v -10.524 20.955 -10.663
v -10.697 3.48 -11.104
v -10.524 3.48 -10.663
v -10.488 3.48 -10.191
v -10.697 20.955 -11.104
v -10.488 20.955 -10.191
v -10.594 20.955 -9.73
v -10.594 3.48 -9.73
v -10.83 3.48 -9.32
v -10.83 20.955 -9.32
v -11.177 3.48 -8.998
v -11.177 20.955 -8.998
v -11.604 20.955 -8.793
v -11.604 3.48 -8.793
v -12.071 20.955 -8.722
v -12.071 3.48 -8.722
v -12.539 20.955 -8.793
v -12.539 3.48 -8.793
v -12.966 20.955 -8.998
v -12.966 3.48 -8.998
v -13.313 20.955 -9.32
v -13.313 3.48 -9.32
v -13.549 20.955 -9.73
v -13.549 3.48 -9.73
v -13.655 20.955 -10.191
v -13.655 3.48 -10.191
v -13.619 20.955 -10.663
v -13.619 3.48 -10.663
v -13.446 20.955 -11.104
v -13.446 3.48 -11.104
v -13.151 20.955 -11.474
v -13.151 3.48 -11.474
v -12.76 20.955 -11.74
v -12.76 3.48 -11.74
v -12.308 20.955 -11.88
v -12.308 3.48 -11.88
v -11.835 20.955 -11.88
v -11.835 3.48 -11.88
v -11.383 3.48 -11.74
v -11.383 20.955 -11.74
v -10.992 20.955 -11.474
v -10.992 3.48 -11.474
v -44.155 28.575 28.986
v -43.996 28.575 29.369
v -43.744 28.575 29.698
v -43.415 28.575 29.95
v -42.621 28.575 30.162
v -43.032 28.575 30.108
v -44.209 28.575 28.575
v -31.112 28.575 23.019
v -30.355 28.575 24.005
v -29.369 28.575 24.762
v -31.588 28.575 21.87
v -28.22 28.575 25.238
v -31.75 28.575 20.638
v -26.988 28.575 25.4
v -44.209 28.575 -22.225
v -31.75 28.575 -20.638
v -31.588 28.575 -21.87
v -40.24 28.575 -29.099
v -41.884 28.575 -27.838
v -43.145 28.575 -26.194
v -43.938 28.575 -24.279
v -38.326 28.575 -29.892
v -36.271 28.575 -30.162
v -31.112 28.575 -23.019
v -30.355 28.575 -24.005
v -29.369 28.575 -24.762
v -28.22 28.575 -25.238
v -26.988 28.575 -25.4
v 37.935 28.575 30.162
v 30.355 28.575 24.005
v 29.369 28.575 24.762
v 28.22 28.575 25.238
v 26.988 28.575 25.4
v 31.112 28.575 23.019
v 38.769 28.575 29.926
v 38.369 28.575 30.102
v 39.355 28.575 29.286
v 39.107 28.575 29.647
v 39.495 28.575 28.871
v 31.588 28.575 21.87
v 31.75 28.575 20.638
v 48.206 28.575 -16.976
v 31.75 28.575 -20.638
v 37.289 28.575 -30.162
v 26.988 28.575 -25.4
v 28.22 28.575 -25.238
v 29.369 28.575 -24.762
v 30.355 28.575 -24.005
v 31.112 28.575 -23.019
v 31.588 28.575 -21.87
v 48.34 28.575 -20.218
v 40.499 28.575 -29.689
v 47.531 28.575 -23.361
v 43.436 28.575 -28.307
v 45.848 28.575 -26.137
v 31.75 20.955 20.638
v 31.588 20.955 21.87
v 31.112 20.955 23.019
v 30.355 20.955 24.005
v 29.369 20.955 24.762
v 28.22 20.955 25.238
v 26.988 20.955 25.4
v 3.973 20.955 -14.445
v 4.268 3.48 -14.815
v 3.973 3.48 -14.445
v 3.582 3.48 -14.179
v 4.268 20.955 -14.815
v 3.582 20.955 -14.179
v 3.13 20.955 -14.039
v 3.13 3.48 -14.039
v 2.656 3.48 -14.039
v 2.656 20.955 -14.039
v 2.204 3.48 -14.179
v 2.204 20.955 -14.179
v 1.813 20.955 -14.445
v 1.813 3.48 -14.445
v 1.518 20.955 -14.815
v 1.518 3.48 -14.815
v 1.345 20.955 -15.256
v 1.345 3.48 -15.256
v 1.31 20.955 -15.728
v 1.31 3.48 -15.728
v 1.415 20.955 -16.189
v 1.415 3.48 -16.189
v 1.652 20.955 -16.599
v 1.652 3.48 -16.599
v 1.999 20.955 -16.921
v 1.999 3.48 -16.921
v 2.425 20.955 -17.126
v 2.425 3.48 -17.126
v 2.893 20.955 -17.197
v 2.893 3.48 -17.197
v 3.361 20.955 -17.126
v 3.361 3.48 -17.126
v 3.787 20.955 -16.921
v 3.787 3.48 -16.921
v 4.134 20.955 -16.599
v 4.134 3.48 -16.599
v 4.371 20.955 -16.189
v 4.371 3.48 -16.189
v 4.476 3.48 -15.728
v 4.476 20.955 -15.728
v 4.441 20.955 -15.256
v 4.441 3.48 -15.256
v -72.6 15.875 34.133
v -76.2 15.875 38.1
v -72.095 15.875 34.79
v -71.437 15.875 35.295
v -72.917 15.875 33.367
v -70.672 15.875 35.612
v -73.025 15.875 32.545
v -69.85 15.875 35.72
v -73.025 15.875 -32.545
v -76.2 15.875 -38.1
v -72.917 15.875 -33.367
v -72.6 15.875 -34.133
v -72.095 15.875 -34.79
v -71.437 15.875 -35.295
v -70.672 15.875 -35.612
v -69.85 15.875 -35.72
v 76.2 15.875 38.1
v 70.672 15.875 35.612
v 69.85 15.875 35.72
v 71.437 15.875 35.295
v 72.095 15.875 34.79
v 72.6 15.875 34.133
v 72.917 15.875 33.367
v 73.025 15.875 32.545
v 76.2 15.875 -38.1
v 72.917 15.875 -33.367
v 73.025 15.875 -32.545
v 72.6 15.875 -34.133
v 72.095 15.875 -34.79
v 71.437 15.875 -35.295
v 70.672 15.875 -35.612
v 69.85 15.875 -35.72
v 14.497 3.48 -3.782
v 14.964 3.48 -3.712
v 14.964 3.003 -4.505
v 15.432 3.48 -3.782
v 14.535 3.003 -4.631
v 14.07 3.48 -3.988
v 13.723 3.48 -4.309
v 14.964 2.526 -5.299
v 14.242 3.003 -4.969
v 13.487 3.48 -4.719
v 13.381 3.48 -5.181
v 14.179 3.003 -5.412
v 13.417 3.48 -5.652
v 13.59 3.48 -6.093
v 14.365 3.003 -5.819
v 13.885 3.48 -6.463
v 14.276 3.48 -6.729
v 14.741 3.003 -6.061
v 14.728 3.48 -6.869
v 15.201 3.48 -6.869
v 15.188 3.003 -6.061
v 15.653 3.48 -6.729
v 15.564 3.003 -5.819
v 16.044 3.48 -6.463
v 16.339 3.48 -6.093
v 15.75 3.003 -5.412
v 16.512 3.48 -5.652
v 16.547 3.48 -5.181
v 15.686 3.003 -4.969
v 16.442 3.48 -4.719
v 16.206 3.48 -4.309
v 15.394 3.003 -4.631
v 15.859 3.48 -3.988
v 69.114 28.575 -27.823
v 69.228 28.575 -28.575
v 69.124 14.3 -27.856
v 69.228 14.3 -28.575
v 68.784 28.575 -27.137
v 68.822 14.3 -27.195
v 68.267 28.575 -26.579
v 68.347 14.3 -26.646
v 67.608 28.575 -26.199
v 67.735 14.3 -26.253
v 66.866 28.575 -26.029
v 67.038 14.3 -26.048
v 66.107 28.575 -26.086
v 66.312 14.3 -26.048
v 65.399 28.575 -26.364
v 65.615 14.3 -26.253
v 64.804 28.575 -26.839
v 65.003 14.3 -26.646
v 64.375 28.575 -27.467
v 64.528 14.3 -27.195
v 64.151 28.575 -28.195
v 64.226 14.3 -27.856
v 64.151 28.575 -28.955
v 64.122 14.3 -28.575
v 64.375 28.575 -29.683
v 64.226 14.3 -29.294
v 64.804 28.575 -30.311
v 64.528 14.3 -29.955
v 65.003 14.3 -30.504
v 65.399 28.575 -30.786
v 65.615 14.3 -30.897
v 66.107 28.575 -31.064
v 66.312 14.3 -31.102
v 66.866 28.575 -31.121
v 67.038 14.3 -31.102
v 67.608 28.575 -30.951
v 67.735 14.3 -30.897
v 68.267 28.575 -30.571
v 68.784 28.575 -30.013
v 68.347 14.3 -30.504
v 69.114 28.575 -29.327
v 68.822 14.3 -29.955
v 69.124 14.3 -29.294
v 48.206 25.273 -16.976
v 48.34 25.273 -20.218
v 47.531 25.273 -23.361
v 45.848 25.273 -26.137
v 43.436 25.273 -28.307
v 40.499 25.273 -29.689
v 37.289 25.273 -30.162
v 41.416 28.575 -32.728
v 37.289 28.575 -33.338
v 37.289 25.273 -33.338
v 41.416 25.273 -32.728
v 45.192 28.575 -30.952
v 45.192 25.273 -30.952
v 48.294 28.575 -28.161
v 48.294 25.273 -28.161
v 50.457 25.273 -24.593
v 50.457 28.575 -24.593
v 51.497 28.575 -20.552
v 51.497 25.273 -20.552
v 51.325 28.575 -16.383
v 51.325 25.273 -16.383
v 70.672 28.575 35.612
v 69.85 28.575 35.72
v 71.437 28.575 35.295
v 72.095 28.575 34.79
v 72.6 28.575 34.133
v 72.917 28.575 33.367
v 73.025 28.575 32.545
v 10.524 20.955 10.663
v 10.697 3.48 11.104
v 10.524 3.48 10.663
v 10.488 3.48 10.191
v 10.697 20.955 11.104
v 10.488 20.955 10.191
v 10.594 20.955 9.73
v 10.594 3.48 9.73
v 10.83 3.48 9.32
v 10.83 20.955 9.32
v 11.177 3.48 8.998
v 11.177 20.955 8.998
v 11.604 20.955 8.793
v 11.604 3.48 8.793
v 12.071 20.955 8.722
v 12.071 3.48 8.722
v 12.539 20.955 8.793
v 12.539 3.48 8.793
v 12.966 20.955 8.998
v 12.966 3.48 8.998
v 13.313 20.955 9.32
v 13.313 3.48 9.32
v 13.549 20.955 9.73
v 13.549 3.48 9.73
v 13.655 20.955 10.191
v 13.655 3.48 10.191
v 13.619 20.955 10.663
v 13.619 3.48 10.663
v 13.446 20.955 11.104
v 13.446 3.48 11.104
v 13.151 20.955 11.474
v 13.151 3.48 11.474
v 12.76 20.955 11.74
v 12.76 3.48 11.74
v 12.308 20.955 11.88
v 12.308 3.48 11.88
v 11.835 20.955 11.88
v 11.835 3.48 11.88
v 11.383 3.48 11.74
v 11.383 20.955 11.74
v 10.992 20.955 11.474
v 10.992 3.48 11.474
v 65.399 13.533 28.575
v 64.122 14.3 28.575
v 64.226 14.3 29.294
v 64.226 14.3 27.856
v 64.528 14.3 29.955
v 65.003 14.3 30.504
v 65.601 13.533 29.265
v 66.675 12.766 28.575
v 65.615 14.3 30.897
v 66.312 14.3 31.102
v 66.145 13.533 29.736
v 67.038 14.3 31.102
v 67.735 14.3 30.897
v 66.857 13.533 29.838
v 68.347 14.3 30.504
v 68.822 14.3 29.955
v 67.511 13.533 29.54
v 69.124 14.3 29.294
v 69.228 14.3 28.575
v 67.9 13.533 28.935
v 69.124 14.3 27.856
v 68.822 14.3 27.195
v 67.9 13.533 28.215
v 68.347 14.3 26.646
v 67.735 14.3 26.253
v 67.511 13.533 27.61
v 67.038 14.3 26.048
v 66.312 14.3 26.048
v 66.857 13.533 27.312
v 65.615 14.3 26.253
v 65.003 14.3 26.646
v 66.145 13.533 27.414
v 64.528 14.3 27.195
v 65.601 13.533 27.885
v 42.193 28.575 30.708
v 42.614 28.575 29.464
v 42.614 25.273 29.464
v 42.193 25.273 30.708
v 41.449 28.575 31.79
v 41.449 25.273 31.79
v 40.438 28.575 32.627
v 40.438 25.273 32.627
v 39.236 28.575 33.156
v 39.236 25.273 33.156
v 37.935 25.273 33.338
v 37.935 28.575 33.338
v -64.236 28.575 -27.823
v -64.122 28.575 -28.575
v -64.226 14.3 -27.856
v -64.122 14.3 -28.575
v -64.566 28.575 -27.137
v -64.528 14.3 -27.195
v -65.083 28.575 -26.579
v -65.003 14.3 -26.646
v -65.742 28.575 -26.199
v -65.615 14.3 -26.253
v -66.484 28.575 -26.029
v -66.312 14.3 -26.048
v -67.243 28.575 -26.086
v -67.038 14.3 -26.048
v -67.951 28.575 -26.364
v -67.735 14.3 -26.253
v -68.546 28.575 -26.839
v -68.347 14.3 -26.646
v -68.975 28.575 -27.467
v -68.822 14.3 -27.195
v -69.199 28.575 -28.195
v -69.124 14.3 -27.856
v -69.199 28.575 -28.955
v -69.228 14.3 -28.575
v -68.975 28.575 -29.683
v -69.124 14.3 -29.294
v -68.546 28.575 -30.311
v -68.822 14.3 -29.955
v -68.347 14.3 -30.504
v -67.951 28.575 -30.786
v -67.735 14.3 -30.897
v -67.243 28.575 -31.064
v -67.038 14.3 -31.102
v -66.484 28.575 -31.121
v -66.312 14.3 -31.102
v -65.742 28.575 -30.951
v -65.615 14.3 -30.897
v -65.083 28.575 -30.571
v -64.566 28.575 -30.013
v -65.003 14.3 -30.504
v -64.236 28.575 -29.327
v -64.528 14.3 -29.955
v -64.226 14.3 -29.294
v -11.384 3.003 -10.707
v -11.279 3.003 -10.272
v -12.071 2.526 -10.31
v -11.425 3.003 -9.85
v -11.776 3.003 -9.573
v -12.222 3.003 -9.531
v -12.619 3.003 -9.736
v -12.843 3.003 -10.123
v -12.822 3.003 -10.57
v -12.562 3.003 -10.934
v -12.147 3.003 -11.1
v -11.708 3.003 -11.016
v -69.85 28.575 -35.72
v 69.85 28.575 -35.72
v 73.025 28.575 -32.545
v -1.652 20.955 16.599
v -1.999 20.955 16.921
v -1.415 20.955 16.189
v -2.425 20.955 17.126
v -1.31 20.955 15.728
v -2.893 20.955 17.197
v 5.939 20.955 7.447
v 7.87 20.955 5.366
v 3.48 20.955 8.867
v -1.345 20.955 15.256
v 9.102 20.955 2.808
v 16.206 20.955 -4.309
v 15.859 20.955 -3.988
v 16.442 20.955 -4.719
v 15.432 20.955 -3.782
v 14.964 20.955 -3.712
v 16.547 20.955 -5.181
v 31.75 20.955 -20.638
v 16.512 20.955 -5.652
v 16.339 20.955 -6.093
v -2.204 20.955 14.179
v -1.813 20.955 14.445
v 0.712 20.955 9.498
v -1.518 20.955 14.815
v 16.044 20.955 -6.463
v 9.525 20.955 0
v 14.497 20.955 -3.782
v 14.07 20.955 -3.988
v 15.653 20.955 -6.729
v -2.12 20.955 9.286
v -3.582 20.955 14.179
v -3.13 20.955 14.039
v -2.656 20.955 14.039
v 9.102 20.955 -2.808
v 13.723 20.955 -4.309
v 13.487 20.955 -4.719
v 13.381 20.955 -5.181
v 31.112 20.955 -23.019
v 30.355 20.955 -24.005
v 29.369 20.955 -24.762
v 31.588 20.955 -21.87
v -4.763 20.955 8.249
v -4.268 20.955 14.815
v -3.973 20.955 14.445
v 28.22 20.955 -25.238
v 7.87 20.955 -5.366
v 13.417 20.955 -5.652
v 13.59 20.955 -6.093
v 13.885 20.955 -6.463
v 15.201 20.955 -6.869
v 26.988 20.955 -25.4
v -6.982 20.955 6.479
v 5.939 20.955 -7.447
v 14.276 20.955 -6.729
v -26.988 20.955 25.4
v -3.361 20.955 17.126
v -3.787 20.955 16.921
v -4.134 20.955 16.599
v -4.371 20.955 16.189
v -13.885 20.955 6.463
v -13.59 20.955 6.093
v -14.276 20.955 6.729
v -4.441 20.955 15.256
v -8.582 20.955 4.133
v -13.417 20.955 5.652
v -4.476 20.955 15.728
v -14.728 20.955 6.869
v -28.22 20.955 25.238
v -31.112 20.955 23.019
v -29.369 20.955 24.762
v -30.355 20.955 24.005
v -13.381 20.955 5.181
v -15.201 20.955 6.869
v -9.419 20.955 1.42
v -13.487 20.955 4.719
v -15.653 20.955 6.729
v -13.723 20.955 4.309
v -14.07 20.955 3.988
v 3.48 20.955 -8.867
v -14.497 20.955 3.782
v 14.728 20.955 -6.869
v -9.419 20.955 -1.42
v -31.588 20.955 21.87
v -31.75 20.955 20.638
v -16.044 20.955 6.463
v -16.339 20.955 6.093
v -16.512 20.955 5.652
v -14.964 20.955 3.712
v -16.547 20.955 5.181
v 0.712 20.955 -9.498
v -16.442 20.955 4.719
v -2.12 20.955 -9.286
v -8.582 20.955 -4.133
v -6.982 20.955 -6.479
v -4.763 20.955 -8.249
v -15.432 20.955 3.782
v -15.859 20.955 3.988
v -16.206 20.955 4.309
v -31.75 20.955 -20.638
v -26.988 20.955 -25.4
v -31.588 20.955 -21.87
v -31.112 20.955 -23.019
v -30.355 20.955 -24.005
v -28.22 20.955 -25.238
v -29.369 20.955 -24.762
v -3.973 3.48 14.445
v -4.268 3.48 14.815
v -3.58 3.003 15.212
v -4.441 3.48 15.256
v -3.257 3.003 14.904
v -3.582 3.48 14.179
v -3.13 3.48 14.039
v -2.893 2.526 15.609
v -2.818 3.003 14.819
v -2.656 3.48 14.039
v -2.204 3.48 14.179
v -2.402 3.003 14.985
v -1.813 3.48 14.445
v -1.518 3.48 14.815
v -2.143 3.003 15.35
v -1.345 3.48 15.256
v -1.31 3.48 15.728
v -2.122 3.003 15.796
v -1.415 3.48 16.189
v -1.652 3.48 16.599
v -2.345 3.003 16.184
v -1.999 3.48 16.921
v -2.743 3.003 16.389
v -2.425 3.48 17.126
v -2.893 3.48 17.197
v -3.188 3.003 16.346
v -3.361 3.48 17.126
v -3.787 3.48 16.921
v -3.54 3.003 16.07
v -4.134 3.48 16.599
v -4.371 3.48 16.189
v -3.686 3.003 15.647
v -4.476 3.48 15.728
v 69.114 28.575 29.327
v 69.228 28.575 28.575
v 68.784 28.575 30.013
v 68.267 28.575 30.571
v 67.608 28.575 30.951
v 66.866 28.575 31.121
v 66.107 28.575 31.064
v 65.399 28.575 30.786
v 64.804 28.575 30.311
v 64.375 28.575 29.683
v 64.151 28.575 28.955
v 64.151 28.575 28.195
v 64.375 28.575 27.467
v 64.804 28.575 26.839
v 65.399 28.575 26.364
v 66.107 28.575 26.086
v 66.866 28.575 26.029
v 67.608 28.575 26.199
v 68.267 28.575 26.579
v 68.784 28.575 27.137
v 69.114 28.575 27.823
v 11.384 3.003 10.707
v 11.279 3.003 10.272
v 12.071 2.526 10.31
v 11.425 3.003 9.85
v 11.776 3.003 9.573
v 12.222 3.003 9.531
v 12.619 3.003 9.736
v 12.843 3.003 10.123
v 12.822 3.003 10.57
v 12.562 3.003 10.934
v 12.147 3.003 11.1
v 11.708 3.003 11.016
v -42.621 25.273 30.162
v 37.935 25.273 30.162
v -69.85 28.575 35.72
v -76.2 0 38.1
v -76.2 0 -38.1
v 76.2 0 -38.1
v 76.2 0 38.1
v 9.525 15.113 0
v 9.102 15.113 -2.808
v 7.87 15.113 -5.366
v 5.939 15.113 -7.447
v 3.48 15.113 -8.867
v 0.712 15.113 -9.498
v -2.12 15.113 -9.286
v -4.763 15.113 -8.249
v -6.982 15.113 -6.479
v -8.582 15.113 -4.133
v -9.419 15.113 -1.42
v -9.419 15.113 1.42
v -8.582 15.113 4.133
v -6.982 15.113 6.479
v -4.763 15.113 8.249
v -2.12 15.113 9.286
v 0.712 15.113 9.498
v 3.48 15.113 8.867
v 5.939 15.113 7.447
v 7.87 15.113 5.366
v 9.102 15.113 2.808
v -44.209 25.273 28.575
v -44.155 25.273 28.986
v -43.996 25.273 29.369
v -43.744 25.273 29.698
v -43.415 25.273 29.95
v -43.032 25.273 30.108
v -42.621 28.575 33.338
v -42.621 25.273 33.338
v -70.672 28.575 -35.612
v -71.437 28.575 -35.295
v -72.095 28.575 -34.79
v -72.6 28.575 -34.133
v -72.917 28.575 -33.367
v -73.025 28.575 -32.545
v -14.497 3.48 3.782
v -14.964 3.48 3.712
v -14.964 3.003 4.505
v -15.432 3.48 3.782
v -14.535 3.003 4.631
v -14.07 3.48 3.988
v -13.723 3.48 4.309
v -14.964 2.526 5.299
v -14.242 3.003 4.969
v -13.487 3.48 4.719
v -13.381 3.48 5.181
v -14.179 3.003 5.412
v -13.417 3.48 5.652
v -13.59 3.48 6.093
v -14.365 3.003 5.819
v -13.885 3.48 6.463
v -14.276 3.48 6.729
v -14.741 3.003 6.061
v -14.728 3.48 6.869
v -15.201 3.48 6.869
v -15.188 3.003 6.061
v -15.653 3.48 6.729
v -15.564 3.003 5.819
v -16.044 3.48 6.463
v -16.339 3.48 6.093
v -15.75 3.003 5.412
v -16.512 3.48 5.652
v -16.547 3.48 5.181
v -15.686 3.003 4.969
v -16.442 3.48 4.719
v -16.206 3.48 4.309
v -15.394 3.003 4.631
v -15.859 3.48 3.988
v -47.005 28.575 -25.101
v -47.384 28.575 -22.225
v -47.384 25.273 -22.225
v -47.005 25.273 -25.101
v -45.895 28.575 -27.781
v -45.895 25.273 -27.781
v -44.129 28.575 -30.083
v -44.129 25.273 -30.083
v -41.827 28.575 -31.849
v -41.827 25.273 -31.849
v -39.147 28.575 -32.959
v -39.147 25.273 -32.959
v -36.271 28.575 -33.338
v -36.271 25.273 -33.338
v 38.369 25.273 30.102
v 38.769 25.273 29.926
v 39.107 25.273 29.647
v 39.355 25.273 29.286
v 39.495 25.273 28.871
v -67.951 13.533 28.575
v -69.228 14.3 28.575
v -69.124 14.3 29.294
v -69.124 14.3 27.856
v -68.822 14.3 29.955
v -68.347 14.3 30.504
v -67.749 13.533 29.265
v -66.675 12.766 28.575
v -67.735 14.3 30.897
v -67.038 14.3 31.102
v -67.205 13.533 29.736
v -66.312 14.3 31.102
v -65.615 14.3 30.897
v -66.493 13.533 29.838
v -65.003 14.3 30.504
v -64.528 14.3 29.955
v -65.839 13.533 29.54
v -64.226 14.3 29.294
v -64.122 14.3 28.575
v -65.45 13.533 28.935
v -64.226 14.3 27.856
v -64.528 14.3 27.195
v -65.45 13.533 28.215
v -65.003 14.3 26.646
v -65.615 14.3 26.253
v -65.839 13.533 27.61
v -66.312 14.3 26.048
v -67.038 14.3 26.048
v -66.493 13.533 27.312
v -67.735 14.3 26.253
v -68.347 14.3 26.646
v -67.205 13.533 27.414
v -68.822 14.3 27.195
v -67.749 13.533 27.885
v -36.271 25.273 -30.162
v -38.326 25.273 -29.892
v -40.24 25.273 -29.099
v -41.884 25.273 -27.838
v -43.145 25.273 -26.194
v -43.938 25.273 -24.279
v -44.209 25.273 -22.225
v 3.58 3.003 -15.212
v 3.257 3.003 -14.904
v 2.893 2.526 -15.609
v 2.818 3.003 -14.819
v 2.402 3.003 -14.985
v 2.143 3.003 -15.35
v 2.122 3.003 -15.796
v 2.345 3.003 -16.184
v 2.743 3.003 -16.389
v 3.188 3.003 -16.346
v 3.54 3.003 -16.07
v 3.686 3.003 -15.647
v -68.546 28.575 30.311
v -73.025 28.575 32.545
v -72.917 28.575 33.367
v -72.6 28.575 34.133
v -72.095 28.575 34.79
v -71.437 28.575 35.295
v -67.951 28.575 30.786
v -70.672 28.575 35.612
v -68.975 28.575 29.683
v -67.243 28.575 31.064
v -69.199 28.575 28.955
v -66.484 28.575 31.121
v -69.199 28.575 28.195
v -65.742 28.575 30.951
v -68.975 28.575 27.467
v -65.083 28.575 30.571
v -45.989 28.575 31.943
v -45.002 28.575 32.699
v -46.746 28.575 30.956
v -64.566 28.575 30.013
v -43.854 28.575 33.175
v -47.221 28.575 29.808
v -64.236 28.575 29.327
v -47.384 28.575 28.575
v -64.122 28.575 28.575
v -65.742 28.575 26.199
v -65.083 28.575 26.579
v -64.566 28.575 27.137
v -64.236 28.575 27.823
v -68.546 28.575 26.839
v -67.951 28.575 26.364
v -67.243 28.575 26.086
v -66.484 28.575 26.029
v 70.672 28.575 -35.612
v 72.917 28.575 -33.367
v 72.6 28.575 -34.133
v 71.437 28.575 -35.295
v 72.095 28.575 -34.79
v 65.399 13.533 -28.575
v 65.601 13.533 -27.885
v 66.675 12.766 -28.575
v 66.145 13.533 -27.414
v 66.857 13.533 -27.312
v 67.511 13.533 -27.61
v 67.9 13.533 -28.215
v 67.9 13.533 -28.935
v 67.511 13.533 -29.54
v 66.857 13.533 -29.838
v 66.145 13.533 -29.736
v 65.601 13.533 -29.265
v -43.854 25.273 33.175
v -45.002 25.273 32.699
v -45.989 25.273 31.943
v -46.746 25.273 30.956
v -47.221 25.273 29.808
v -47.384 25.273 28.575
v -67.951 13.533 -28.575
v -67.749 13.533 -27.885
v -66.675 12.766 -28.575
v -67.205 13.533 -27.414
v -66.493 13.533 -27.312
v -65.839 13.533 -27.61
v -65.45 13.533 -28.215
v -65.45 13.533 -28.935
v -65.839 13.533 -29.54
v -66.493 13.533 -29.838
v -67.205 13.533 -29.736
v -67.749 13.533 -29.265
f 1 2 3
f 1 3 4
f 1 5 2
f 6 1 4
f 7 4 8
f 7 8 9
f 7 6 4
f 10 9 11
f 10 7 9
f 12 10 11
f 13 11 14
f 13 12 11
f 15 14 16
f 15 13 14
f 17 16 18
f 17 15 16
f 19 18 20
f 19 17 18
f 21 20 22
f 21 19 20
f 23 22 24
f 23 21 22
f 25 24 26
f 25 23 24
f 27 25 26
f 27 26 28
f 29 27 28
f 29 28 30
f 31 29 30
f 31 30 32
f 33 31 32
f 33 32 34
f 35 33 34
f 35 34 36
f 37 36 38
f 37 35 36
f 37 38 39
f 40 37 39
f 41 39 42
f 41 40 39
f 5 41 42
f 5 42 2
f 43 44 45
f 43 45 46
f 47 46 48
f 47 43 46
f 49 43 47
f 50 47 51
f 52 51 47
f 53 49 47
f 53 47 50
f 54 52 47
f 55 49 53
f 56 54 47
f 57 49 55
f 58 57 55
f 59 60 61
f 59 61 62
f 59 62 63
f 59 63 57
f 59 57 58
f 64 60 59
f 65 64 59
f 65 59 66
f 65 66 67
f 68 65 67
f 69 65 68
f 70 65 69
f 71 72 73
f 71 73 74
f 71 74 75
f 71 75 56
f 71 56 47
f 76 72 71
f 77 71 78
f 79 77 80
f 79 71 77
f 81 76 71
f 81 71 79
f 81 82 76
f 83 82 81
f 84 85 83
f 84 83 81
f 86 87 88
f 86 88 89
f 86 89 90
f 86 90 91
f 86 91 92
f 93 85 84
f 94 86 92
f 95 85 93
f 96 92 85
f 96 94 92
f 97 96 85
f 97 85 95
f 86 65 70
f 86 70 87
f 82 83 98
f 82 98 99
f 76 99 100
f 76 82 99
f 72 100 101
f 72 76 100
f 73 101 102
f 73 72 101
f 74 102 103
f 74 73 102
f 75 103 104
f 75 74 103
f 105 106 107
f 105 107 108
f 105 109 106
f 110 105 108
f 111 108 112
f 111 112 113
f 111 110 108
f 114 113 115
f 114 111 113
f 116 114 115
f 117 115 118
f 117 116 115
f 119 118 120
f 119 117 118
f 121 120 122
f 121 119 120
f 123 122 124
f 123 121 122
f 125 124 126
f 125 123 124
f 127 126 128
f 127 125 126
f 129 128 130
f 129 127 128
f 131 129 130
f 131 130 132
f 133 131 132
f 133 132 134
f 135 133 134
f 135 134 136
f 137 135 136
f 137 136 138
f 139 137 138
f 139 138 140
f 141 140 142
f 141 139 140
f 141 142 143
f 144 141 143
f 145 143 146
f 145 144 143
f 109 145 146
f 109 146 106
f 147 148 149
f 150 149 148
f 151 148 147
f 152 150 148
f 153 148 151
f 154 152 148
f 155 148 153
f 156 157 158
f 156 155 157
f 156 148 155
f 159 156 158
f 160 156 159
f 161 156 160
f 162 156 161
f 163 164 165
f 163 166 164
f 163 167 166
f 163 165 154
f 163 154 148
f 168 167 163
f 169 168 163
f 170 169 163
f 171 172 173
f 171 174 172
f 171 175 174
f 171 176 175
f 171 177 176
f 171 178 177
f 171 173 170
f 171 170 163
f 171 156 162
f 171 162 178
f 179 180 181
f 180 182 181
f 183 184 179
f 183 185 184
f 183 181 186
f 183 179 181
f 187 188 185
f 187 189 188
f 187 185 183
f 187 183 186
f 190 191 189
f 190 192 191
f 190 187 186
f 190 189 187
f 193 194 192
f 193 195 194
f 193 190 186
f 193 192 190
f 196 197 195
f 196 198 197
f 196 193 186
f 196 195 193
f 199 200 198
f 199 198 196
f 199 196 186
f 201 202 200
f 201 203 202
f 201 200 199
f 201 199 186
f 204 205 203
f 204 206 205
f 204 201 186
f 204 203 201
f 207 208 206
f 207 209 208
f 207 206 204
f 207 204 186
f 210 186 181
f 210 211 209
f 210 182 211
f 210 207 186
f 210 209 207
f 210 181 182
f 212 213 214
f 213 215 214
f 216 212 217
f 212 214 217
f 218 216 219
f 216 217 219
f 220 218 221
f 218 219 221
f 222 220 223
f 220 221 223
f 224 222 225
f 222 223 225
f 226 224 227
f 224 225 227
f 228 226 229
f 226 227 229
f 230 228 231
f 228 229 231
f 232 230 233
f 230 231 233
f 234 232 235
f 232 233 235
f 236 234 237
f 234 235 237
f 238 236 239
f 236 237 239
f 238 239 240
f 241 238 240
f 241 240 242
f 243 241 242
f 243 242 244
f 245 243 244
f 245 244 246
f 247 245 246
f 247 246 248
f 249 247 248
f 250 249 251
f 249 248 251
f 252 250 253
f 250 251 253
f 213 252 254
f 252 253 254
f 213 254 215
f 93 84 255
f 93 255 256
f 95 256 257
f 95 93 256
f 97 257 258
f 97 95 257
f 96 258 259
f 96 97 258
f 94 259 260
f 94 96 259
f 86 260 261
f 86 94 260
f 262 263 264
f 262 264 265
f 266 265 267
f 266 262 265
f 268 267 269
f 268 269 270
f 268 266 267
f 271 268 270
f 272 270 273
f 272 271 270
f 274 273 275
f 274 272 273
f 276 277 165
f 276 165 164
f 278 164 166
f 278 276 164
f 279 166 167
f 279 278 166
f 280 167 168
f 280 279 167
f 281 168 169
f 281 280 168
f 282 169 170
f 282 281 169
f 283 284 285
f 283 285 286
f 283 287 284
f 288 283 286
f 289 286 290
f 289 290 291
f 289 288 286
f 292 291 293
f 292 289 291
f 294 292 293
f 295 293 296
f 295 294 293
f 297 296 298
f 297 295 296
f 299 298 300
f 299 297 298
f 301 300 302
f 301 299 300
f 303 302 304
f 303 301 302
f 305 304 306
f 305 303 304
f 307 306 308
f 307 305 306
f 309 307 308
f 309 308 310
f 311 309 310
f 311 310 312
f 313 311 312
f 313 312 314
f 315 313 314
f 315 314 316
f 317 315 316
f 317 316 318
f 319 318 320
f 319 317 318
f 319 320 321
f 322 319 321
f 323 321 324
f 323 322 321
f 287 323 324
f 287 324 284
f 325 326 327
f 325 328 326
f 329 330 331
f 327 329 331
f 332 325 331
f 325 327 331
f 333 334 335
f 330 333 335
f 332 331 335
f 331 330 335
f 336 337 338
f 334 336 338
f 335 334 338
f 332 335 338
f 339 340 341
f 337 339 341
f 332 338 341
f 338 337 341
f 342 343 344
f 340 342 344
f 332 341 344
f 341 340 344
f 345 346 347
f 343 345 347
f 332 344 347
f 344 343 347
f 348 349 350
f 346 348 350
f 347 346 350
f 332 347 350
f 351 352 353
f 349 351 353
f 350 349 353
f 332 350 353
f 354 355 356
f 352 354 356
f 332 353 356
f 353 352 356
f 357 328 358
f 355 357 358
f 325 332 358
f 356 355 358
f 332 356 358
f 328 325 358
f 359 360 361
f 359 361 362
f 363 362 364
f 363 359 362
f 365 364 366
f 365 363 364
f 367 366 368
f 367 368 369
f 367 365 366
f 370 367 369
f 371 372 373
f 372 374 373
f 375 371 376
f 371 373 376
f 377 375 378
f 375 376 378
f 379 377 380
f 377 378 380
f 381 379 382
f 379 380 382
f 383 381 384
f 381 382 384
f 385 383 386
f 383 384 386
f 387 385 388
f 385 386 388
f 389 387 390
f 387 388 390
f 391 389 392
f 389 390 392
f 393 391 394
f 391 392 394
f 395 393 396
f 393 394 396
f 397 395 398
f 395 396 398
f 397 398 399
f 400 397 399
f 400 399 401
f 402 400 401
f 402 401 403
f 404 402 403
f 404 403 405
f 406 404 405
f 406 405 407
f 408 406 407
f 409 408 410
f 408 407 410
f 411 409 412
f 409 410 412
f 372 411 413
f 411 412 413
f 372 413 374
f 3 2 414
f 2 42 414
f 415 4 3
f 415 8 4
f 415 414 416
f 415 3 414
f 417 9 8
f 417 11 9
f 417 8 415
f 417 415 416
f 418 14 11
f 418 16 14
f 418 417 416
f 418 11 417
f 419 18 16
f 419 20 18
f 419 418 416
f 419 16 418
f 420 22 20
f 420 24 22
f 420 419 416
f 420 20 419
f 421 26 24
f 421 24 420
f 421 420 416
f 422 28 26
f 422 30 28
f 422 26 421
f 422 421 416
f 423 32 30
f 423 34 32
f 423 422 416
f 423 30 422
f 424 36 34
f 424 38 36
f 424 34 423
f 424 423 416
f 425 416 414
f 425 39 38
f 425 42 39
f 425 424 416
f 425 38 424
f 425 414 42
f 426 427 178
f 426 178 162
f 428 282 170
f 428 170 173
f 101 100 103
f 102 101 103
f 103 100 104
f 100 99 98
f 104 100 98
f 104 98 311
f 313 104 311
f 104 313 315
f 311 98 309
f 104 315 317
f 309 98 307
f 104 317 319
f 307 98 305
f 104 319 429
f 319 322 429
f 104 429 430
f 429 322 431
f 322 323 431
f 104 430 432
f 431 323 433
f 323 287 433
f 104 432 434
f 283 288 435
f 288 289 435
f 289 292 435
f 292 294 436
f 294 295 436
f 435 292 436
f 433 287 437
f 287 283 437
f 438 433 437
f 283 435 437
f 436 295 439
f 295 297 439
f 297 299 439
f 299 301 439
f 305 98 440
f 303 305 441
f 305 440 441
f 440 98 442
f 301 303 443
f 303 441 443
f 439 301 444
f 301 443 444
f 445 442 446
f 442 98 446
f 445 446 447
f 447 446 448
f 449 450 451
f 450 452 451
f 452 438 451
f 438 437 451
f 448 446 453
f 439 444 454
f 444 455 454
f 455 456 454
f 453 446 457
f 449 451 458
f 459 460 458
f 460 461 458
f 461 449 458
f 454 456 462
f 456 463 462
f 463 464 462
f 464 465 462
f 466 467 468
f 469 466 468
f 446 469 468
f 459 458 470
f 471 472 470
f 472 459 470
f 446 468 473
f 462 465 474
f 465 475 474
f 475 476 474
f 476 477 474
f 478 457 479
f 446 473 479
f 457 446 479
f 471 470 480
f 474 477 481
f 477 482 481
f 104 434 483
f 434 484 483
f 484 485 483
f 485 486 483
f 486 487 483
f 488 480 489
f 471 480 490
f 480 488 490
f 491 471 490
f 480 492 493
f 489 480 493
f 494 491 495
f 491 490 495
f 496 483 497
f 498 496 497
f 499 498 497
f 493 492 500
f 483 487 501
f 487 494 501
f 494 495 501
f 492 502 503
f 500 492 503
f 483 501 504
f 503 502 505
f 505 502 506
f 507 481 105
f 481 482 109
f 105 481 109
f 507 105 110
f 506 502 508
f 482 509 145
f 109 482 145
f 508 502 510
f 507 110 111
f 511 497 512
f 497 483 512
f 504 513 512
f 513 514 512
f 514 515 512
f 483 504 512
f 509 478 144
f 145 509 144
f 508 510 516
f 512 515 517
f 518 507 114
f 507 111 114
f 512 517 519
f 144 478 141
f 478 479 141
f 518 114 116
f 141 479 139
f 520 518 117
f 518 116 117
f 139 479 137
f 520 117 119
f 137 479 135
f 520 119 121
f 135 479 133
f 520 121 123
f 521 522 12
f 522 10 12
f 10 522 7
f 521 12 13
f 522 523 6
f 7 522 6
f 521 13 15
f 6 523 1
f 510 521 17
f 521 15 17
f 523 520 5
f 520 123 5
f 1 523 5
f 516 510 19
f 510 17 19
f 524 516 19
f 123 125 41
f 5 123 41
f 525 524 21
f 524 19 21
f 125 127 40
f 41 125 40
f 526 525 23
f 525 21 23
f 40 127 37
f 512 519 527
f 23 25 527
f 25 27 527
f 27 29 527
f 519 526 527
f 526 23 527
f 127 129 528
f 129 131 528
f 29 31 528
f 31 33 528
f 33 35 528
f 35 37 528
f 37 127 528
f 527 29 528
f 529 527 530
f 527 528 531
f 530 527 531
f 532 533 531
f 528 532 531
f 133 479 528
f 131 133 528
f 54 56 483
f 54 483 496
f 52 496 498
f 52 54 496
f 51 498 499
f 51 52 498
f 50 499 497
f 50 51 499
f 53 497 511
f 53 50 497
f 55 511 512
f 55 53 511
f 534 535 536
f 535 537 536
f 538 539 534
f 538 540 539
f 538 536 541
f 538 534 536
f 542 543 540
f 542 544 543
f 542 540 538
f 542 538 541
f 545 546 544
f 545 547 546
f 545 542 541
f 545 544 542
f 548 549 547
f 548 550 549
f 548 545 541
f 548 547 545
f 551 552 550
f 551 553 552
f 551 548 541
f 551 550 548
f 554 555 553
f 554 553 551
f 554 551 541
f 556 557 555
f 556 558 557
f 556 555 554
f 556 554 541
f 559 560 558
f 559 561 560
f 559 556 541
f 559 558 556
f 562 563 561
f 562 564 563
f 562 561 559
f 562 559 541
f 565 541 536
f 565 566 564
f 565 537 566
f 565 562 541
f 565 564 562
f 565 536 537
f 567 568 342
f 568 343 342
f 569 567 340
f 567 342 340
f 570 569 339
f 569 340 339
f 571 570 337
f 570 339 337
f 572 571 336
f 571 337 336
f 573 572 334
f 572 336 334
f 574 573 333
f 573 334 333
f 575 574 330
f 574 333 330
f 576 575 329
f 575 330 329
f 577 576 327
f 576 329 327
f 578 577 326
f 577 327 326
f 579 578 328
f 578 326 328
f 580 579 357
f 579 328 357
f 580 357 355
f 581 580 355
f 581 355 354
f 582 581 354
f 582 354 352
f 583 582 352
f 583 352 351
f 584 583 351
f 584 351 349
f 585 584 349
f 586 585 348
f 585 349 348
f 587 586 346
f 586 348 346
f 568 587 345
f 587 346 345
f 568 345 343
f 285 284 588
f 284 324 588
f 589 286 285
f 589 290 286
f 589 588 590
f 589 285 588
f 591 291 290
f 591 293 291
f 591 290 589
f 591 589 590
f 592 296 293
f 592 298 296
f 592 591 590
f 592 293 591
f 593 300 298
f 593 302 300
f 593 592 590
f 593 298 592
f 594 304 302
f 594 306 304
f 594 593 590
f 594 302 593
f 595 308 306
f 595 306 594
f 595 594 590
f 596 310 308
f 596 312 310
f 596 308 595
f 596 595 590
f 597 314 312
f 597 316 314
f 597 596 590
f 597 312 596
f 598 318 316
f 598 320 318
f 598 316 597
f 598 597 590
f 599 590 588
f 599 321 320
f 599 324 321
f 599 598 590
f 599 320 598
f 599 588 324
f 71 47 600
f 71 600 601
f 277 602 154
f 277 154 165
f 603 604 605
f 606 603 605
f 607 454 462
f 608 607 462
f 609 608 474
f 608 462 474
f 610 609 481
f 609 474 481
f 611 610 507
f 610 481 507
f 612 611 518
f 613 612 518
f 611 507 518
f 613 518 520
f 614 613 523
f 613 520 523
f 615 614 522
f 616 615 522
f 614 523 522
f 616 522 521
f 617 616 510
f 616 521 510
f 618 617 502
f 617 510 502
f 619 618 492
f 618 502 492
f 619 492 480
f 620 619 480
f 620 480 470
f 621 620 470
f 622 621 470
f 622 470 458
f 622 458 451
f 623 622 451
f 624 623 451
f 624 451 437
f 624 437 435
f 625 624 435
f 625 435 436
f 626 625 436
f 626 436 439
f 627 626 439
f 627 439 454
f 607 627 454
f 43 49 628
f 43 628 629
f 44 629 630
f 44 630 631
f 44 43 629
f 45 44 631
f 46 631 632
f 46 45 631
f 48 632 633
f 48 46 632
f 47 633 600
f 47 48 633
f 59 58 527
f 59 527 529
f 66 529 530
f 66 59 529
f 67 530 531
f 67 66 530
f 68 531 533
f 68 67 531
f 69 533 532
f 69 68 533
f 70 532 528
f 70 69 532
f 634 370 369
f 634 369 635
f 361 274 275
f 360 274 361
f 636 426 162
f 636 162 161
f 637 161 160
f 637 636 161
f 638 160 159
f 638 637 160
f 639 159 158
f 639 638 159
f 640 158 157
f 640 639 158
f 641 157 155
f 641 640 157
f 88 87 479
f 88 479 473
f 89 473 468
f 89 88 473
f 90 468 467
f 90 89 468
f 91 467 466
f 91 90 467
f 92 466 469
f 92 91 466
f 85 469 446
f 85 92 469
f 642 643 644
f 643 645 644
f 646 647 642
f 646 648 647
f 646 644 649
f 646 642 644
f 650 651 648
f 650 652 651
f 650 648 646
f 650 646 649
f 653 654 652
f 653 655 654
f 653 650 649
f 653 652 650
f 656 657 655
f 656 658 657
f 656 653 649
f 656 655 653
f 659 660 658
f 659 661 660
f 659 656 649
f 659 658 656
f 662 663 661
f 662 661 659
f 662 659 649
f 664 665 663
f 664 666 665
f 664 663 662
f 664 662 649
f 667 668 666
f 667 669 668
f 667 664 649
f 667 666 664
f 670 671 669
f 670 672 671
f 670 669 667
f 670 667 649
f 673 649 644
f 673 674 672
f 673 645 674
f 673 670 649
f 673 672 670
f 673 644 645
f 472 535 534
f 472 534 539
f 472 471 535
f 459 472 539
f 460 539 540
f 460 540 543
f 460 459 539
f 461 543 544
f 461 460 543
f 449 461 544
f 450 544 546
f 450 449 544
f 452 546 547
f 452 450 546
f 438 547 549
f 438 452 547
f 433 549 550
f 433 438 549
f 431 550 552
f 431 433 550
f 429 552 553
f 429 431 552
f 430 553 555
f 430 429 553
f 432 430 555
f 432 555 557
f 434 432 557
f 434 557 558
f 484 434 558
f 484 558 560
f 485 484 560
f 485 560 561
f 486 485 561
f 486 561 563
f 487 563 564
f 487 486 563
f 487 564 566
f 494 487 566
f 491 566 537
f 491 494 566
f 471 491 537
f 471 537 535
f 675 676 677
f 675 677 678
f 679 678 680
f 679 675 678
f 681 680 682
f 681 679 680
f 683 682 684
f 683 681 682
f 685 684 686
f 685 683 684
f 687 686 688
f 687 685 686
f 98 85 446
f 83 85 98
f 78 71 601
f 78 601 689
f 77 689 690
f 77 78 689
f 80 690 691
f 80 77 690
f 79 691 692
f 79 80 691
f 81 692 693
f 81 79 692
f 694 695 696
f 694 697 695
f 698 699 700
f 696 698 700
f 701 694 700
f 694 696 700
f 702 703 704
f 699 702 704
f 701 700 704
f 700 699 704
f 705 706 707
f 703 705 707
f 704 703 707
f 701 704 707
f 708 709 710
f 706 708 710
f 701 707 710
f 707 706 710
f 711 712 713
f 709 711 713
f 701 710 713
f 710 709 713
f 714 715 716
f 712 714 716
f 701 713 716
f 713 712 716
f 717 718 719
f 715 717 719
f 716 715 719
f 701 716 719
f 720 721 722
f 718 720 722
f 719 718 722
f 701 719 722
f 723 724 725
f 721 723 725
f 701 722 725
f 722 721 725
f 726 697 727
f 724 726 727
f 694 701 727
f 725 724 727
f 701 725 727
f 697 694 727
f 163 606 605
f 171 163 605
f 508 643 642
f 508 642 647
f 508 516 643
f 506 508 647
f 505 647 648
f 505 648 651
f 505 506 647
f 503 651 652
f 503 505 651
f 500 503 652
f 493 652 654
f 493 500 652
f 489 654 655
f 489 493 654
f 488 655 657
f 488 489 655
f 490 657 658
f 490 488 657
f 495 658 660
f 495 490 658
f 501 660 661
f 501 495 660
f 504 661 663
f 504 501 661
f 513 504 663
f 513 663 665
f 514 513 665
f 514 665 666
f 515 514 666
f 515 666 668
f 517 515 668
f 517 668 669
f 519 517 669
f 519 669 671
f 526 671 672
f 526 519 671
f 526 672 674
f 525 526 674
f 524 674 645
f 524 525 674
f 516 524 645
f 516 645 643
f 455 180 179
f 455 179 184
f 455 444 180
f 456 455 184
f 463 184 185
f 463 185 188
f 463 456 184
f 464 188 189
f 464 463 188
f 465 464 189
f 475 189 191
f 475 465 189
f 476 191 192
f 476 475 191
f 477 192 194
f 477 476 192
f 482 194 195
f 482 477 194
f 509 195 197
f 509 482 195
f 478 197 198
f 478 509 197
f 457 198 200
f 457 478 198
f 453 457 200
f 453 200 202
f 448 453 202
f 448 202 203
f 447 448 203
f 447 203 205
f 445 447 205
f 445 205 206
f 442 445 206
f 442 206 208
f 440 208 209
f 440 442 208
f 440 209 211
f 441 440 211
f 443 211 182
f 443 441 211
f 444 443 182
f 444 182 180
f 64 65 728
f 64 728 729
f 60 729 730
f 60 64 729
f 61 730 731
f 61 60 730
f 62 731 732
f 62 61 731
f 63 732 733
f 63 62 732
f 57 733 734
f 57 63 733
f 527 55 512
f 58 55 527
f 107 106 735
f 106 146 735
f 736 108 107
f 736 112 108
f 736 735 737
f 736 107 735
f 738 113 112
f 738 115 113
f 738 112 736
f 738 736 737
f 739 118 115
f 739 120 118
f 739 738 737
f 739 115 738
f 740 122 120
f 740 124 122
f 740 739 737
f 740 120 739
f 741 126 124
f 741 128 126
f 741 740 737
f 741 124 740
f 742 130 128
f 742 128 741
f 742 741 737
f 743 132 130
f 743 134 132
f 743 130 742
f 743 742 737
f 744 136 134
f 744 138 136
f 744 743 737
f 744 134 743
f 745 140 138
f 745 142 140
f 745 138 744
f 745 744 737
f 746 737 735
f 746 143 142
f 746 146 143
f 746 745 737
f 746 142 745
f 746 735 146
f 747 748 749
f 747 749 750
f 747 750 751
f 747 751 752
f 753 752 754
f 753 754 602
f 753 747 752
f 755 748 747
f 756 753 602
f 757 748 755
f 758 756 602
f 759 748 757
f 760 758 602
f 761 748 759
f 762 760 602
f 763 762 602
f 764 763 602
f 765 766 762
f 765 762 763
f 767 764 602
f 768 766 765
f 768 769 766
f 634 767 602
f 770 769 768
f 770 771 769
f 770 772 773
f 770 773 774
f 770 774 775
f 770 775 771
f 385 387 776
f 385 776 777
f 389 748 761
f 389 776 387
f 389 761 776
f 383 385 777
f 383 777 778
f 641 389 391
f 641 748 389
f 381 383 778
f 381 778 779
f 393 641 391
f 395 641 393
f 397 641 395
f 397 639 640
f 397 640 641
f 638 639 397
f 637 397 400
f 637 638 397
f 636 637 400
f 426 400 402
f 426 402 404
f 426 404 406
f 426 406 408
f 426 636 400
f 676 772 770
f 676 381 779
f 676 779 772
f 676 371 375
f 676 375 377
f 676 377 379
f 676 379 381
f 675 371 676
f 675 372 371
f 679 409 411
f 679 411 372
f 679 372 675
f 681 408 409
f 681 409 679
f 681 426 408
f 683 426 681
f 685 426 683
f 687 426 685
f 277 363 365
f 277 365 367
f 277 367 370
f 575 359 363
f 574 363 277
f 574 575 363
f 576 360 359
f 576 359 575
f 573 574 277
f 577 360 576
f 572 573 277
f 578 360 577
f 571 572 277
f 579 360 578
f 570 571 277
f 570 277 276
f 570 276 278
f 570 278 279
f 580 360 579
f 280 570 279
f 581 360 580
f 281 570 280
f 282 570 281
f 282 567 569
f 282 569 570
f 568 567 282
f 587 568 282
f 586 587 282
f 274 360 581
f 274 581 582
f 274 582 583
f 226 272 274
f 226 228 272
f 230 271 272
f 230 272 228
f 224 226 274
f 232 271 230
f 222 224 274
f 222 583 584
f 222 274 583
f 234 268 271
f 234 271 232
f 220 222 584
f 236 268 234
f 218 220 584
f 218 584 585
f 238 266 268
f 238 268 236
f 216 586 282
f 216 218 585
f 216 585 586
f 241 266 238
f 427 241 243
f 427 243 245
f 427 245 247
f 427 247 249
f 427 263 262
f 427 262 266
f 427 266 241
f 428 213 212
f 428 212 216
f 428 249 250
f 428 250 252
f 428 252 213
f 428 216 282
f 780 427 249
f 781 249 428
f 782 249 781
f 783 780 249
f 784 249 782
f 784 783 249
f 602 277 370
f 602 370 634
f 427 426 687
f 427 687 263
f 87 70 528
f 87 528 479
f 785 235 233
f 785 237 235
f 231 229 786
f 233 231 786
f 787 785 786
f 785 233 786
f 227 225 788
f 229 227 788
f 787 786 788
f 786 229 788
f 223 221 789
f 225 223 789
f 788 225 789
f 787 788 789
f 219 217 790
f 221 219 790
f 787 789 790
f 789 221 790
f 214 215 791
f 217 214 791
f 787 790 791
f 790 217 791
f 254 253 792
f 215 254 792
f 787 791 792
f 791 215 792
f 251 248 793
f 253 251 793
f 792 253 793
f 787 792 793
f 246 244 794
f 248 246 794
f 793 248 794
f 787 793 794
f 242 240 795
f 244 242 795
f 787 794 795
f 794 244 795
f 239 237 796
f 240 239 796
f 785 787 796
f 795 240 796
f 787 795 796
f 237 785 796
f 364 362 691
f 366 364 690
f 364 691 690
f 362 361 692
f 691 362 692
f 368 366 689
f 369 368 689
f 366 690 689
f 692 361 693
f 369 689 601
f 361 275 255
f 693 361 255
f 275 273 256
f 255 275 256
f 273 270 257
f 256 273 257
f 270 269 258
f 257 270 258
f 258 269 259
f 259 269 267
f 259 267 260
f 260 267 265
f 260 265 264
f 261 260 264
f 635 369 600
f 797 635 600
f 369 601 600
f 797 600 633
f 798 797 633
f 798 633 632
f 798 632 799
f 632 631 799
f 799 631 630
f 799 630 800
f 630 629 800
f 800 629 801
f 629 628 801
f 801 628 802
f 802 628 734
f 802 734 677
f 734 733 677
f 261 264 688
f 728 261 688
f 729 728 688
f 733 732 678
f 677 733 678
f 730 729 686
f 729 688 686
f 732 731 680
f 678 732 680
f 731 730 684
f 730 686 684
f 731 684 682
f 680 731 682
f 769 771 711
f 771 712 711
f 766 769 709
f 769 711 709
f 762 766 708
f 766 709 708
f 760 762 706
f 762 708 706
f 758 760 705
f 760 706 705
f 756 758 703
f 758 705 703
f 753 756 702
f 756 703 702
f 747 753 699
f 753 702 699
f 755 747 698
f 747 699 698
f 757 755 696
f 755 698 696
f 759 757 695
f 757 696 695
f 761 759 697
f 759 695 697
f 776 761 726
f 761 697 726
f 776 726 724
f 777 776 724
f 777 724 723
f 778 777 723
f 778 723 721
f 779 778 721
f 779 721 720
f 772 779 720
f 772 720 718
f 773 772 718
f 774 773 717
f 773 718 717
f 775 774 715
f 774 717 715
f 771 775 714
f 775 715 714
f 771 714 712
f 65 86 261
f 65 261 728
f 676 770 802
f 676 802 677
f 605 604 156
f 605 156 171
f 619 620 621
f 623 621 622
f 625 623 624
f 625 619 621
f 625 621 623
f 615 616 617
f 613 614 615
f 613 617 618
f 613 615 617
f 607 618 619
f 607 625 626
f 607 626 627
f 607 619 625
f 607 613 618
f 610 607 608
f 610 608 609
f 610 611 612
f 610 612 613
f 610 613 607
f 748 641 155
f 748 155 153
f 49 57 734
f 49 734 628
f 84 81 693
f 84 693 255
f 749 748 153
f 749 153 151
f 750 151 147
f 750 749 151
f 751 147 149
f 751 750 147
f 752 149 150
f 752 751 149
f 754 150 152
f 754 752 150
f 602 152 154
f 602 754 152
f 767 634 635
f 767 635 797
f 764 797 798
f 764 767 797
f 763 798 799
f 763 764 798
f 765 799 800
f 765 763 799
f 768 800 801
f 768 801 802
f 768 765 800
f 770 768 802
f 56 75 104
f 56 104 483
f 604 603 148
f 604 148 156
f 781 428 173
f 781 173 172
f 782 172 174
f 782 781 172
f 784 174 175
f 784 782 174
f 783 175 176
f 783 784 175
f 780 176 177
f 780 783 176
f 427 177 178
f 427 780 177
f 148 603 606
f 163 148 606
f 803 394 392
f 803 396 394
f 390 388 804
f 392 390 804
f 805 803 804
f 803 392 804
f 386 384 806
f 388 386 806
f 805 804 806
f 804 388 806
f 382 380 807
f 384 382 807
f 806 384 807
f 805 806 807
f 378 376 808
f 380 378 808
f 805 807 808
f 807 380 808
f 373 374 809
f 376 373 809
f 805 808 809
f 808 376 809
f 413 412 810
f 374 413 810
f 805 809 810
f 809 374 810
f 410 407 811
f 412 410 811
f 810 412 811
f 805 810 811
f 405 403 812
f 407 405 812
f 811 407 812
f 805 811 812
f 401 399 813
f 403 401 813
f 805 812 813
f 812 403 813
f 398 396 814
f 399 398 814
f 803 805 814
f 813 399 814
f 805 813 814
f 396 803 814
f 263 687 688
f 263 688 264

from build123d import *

# Parameters (mm, degrees)
SKETCH1_W                      = 152.4
SKETCH1_H                      = 76.2
BOSS_EXTRUDE1_DEPTH            = 28.575
SKETCH2_R                      = 9.525
CUT_EXTRUDE1_DEPTH             = 13.462
CUT_EXTRUDE3_DEPTH             = 3.302
CUT_EXTRUDE4_DEPTH             = 7.62
F_7_0_201_DIAMETER_HOLE1_D     = 5.1054
F_7_0_201_DIAMETER_HOLE1_DEPTH = 14.2748
F_7_0_201_DIAMETER_HOLE1_TIP   = 1.533816902
SKETCH10_OUTSIDE_W             = 188.954
SKETCH10_OUTSIDE_H             = 112.754
CUT_EXTRUDE5_DEPTH             = 12.7
CIRPATTERN1_COUNT              = 6


with BuildPart() as part:
    # Sketch1 → Boss-Extrude1 (new body)
    with BuildSketch(Plane(origin=(0, 0, 0), x_dir=(1, 0, 0), z_dir=(0, 1, 0))):
        Rectangle(SKETCH1_W, SKETCH1_H)
    extrude(amount=BOSS_EXTRUDE1_DEPTH)

    # Sketch2 → Cut-Extrude1 (cut)
    with BuildSketch(Plane(origin=(0, 28.575, 0), x_dir=(1, 0, 0), z_dir=(0, 1, 0))):
        Circle(SKETCH2_R)
    extrude(amount=-CUT_EXTRUDE1_DEPTH, mode=Mode.SUBTRACT)

    # Sketch4 → Cut-Extrude3 (cut)
    with BuildSketch(Plane(origin=(0, 28.575, 0), x_dir=(1, 0, 0), z_dir=(0, 1, 0))):
        with BuildLine():
            Line((-36.2712, 33.3375), (37.288597325, 33.3375))
            ThreePointArc((37.288597325, 33.3375), (48.293963964, 28.161232705), (51.324986679, 16.383086023))
            Line((51.324986679, 16.383086023), (42.614045782, -29.463971326))
            ThreePointArc((42.614045782, -29.463971326), (40.9723269, -32.243455546), (37.935249331, -33.3375))
            Line((37.935249331, -33.3375), (-42.6212, -33.3375))
            ThreePointArc((-42.6212, -33.3375), (-45.988796045, -31.942596045), (-47.3837, -28.575))
            Line((-47.3837, -28.575), (-47.3837, 22.225))
            ThreePointArc((-47.3837, 22.225), (-44.128924106, 30.082724106), (-36.2712, 33.3375))
        make_face()
        with BuildLine():
            ThreePointArc((-36.2712, 30.1625), (-41.883860076, 27.837660076), (-44.2087, 22.225))
            Line((-44.2087, 22.225), (-44.2087, -28.575))
            ThreePointArc((-44.2087, -28.575), (-43.743732015, -29.697532015), (-42.6212, -30.1625))
            Line((-42.6212, -30.1625), (37.935249331, -30.1625))
            ThreePointArc((37.935249331, -30.1625), (38.947608521, -29.797818515), (39.494848148, -28.871323775))
            Line((39.494848148, -28.871323775), (48.205789045, 16.975733573))
            ThreePointArc((48.205789045, 16.975733573), (45.848326933, 26.136514326), (37.288597325, 30.1625))
            Line((37.288597325, 30.1625), (-36.2712, 30.1625))
        make_face(mode=Mode.SUBTRACT)
    extrude(amount=-CUT_EXTRUDE3_DEPTH, mode=Mode.SUBTRACT)

    # Sketch7 → Cut-Extrude4 (cut)
    with BuildSketch(Plane(origin=(0, 28.575, 0), x_dir=(1, 0, 0), z_dir=(0, 1, 0))):
        with BuildLine():
            Line((31.75, 20.6375), (31.75, -20.6375))
            ThreePointArc((31.75, -20.6375), (30.355096045, -24.005096045), (26.9875, -25.4))
            Line((26.9875, -25.4), (-26.9875, -25.4))
            ThreePointArc((-26.9875, -25.4), (-30.355096045, -24.005096045), (-31.75, -20.6375))
            Line((-31.75, -20.6375), (-31.75, 20.6375))
            ThreePointArc((-31.75, 20.6375), (-30.355096045, 24.005096045), (-26.9875, 25.4))
            Line((-26.9875, 25.4), (26.9875, 25.4))
            ThreePointArc((26.9875, 25.4), (30.355096045, 24.005096045), (31.75, 20.6375))
        make_face()
    extrude(amount=-CUT_EXTRUDE4_DEPTH, mode=Mode.SUBTRACT)

    # #7 (0.201) Diameter Hole1
    with Locations(Plane(origin=(0, 28.575, 0), x_dir=(-1, 0, 0), z_dir=(0, 1, 0))):
        with Locations((66.675, -28.575), (-66.675, -28.575), (-66.675, 28.575), (66.675, 28.575)):
            Hole(F_7_0_201_DIAMETER_HOLE1_D / 2, depth=F_7_0_201_DIAMETER_HOLE1_DEPTH)
            with Locations((0, 0, -(F_7_0_201_DIAMETER_HOLE1_DEPTH + F_7_0_201_DIAMETER_HOLE1_TIP / 2))):  # 118° drill point
                Cone(0, F_7_0_201_DIAMETER_HOLE1_D / 2, F_7_0_201_DIAMETER_HOLE1_TIP, mode=Mode.SUBTRACT)

    # Sketch10 outside → Cut-Extrude5 (cut)
    with BuildSketch(Plane(origin=(0, 28.575, 0), x_dir=(1, 0, 0), z_dir=(0, 1, 0))):
        Rectangle(SKETCH10_OUTSIDE_W, SKETCH10_OUTSIDE_H)
        with BuildLine():
            Line((-73.025, 32.54502), (-73.025, -32.54502))
            ThreePointArc((-73.025, -32.54502), (-72.09506403, -34.79008403), (-69.85, -35.72002))
            Line((-69.85, -35.72002), (69.85, -35.72002))
            ThreePointArc((69.85, -35.72002), (72.09506403, -34.79008403), (73.025, -32.54502))
            Line((73.025, -32.54502), (73.025, 32.54502))
            ThreePointArc((73.025, 32.54502), (72.09506403, 34.79008403), (69.85, 35.72002))
            Line((69.85, 35.72002), (-69.85, 35.72002))
            ThreePointArc((-69.85, 35.72002), (-72.09506403, 34.79008403), (-73.025, 32.54502))
        make_face(mode=Mode.SUBTRACT)
    extrude(amount=-CUT_EXTRUDE5_DEPTH, mode=Mode.SUBTRACT)

    # Sketch13 → 1/8 (0.125) Diameter Hole1 (revolve, cut)
    with BuildSketch(Plane(origin=(14.964433671, 20.955, -5.29918389), x_dir=(0, 0, 1), z_dir=(1, 0, 0))):
        Polygon((0, 0), (0, 18.429066233), (1.5875, 17.4752), (1.5875, 0), align=None)
    f_1_8_0_125_diameter_hole1 = revolve(axis=Axis((14.964433671, 27.305, -5.29918389), (0, -1, 0)), mode=Mode.SUBTRACT)

    # CirPattern1: 1/8 (0.125) Diameter Hole1 ×6 about axis
    cirpattern1_axis = Axis((0, 0, 0), (0, 1, 0))
    for i in range(1, CIRPATTERN1_COUNT):
        add(f_1_8_0_125_diameter_hole1.rotate(cirpattern1_axis, i * 360 / CIRPATTERN1_COUNT), mode=Mode.SUBTRACT)


solid = part.part
